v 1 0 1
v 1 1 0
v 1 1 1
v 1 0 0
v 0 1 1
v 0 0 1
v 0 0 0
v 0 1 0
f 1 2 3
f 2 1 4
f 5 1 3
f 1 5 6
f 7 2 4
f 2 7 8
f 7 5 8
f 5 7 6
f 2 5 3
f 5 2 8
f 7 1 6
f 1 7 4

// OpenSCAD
// Negative zero: printed as "-0" in CSG, as "0" in echo.
z = 0 * -1;
echo(z, [z], str(z));
translate([z, 0, 0]) cube();
cube([1, z, 1]);
polygon([[z, 0], [1, 0], [0, 1]]);
color([z, 0, 0]) cube();
